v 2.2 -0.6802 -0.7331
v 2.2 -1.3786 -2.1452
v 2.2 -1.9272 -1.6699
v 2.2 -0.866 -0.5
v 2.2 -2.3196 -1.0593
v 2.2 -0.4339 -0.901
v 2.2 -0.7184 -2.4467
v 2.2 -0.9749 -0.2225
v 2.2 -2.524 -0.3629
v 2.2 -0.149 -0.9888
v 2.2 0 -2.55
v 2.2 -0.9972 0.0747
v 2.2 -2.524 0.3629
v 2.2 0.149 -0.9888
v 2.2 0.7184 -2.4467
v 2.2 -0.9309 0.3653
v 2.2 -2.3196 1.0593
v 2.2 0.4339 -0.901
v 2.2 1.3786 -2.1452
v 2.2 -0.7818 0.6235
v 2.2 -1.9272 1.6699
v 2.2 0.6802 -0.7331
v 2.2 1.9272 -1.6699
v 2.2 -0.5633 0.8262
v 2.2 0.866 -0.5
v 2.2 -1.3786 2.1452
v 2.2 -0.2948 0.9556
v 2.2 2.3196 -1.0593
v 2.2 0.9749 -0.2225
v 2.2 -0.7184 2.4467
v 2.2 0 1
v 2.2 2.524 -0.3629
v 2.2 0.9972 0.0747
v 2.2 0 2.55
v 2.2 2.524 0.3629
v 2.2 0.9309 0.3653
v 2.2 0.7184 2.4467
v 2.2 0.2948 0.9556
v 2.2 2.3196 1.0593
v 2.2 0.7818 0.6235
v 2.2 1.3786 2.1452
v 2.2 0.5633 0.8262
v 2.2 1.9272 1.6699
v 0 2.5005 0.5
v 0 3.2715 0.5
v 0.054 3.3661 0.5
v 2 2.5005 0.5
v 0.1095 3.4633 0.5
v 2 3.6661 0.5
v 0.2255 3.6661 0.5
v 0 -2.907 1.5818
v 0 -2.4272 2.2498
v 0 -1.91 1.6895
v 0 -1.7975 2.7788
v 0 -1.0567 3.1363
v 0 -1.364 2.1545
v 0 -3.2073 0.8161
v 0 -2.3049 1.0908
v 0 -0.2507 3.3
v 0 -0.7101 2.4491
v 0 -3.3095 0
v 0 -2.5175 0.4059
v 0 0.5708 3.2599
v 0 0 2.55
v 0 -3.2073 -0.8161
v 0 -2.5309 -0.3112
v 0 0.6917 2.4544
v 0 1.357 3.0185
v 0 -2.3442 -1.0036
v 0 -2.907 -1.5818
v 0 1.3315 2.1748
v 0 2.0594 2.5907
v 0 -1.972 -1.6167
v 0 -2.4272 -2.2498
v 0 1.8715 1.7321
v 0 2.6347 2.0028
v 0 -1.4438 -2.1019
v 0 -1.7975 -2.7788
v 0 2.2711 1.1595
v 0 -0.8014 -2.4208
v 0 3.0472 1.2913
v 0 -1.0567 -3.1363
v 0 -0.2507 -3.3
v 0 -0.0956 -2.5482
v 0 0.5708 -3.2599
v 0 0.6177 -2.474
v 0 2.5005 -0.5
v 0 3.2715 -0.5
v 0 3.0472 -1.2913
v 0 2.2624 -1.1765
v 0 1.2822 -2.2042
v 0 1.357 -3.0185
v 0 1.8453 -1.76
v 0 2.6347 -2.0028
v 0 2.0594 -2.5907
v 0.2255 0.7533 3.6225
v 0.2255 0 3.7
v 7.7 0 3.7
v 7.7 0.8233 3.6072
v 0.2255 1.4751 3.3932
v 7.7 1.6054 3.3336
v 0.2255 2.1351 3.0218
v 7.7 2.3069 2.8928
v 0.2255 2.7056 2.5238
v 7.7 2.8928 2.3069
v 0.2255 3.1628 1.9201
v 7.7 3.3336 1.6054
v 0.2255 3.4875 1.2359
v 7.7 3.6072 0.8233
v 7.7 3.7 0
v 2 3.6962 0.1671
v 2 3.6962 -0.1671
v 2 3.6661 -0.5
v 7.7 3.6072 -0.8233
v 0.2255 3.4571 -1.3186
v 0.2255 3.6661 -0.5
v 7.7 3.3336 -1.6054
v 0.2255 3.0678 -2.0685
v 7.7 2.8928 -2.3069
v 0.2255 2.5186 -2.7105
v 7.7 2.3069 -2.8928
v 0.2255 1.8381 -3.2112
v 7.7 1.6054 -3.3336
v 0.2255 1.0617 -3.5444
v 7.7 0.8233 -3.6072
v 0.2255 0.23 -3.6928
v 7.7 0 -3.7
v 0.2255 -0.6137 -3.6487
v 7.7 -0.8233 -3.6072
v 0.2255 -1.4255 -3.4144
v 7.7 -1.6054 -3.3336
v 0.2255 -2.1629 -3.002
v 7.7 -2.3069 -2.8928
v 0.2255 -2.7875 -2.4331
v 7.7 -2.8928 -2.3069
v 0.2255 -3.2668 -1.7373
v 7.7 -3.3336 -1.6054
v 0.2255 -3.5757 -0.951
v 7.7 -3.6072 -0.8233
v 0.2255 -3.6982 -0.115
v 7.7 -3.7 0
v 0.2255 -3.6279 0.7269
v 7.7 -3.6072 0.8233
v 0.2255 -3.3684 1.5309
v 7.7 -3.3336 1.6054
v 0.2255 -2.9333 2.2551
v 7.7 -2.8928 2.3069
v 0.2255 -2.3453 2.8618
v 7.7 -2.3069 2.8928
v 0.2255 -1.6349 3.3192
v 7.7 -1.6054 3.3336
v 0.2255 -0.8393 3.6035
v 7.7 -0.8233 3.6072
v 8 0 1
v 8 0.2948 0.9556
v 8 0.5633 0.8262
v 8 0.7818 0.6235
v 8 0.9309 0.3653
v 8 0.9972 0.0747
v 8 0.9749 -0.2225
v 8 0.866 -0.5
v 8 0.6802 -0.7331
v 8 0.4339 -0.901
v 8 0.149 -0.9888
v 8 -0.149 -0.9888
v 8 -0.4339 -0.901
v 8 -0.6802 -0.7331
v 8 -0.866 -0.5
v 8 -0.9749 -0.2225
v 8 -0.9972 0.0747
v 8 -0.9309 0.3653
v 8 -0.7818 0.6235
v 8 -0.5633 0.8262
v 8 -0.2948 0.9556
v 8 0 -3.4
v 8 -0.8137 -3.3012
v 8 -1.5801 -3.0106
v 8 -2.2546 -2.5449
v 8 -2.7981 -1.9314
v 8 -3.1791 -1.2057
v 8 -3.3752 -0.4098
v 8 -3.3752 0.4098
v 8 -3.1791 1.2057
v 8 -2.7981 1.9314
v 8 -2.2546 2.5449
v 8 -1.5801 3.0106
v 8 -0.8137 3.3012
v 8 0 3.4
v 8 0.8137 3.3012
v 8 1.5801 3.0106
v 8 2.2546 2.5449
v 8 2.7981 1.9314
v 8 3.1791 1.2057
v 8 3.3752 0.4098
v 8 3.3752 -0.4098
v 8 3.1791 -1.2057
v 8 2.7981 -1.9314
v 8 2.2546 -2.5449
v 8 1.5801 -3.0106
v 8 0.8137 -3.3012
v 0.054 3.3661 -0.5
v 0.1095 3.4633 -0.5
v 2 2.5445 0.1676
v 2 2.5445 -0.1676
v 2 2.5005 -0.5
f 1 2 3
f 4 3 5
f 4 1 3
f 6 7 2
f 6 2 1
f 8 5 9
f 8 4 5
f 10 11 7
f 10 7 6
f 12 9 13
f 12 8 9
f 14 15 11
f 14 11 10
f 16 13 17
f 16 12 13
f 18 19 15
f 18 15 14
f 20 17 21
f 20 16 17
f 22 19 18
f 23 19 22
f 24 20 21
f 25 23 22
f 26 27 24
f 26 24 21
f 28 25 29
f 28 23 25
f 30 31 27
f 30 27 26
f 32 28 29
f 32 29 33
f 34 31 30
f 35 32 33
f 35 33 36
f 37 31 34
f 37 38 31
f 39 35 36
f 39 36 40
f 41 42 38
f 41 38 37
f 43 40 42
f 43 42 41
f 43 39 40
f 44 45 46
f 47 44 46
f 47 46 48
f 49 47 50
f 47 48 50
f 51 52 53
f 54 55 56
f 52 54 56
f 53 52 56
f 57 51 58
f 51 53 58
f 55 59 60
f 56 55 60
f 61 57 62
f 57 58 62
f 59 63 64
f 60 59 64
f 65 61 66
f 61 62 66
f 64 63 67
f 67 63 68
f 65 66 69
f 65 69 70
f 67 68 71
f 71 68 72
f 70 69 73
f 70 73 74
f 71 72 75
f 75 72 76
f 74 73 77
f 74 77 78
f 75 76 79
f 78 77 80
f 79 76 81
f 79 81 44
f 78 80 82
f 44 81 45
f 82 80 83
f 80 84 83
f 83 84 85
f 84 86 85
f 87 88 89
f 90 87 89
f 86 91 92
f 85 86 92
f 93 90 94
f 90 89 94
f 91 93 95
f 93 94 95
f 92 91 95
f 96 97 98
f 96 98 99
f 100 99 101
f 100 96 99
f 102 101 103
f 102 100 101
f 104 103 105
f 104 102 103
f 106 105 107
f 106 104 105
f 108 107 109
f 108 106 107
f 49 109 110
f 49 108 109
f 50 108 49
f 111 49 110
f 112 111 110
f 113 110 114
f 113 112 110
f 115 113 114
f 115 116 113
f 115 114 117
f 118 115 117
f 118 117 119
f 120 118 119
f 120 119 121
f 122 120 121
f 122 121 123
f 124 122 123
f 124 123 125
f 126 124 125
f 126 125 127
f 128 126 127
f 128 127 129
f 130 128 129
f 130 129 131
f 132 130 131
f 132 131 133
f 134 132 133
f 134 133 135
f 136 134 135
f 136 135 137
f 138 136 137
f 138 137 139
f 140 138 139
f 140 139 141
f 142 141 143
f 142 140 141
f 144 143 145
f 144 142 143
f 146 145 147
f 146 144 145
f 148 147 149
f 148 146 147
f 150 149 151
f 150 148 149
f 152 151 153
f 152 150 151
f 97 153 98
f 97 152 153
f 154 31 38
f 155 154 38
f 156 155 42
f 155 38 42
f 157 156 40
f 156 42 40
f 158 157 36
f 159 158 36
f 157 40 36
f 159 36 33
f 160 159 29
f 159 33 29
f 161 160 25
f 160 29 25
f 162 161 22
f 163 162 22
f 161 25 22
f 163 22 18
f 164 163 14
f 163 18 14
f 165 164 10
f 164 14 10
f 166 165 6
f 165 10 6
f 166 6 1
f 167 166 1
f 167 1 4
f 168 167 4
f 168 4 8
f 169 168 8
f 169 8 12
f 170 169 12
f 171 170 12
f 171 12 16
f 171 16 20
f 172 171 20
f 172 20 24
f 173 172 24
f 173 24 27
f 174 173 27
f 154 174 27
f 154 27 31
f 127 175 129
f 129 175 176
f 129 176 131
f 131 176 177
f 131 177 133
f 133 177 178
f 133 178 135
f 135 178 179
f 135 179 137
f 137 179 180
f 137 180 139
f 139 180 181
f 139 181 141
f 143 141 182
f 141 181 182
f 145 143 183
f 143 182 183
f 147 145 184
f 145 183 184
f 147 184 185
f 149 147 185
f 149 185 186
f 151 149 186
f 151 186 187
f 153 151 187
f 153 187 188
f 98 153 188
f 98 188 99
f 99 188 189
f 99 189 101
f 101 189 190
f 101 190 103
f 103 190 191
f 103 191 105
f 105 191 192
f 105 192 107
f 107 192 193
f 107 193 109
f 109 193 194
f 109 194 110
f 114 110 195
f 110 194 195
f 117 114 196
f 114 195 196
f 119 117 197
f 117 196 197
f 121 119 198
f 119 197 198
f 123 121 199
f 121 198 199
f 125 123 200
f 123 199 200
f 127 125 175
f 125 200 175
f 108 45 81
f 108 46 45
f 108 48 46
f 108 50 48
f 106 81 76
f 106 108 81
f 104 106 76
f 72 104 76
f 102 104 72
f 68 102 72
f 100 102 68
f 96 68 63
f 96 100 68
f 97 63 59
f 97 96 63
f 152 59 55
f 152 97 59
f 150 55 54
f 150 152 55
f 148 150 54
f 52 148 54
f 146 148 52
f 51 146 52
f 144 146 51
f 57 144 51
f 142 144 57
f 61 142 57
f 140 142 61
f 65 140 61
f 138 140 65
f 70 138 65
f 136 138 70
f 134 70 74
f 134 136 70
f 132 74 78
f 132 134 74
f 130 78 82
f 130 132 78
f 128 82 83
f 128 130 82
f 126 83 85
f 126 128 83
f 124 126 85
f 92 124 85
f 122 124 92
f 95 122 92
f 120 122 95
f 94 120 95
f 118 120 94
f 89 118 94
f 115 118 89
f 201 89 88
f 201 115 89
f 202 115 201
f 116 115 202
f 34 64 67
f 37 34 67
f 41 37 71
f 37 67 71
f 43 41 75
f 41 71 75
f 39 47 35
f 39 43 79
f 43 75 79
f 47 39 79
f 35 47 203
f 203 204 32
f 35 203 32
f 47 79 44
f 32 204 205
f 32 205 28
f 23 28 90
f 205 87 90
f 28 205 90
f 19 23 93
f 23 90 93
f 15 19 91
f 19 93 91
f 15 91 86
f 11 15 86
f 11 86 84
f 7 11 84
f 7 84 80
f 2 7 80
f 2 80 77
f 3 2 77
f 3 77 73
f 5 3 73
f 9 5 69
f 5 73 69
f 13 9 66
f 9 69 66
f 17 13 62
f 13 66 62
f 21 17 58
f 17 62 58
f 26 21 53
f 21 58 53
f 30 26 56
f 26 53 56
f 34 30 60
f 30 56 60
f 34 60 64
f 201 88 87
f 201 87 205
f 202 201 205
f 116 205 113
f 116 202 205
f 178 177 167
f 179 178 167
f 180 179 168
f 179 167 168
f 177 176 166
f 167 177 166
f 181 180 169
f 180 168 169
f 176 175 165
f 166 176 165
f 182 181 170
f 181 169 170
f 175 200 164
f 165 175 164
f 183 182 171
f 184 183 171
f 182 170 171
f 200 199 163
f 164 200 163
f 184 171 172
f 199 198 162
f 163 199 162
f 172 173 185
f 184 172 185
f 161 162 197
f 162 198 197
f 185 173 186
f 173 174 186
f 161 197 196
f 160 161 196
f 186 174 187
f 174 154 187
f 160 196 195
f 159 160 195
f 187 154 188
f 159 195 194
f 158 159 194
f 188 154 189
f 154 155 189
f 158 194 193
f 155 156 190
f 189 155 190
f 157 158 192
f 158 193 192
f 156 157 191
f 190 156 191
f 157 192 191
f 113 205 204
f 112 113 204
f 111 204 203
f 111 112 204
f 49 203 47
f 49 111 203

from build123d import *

# Parameters (mm, degrees)
CHANFREIN1_SIZE         = 0.6905
CHANFREIN1_SIZE2        = 0.398660361
ESQUISSE3_R             = 2.55
ENL_V_MAT_EXTRU_2_DEPTH = 2.2
ESQUISSE4_R             = 4
ENL_V_MAT_EXTRU_3_DEPTH = 12.2
CHANFREIN2_SIZE         = 0.6
ESQUISSE5_OUTSIDE_W     = 12.772
ESQUISSE5_OUTSIDE_H     = 12.772
ESQUISSE5_OUTSIDE_R     = 3.7
ENL_V_MAT_EXTRU_4_DEPTH = 10.797958971
ESQUISSE6_W             = 1
ESQUISSE6_H             = 2.203007131
ENL_V_MAT_EXTRU_5_DEPTH = 2
ESQUISSE7_R             = 1
ENL_V_MAT_EXTRU_6_DEPTH = 8.81152994


with BuildPart() as part:
    # Esquisse1 → Révolution1 (revolve)
    with BuildSketch(Plane.XY, mode=Mode.PRIVATE) as r_volution1_sk:
        Polygon((0, 4), (0, 0), (12.000000001, 0), (8, 4), align=None)
    revolve(r_volution1_sk.sketch.rotate(Axis((0, 0, 0), (1, 0, 0)), 270), axis=Axis((0, 0, 0), (1, 0, 0)))

    # Chanfrein1
    chanfrein1_edges = [part.edges().sort_by_distance(p)[0] for p in [
        (0, 0, 4),
    ]]
    chanfrein1_side = [part.faces().sort_by_distance(p)[0] for p in [
        (0, 0, 0),
    ]]
    chamfer(chanfrein1_edges, length=CHANFREIN1_SIZE, length2=CHANFREIN1_SIZE2, reference=chanfrein1_side[0])

    # Esquisse3 → Enlèv. mat.-Extru.2 (cut)
    with BuildSketch(Plane.ZY):
        Circle(ESQUISSE3_R)
    extrude(amount=-ENL_V_MAT_EXTRU_2_DEPTH, mode=Mode.SUBTRACT)

    # Esquisse4 → Enlèv. mat.-Extru.3 (cut)
    with BuildSketch(Plane.ZY.offset(-8)):
        Circle(ESQUISSE4_R)
    extrude(amount=-ENL_V_MAT_EXTRU_3_DEPTH, mode=Mode.SUBTRACT)

    # Chanfrein2
    chanfrein2_edges = [part.edges().sort_by_distance(p)[0] for p in [
        (8, 0, 4),
    ]]
    chamfer(chanfrein2_edges, length=CHANFREIN2_SIZE)

    # Esquisse5 outside → Enlèv. mat.-Extru.4 (cut, through all)
    with BuildSketch(Plane.ZY):
        Rectangle(ESQUISSE5_OUTSIDE_W, ESQUISSE5_OUTSIDE_H)
        Circle(ESQUISSE5_OUTSIDE_R, mode=Mode.SUBTRACT)
    extrude(amount=-ENL_V_MAT_EXTRU_4_DEPTH, mode=Mode.SUBTRACT)

    # Esquisse6 → Enlèv. mat.-Extru.5 (cut)
    with BuildSketch(Plane.ZY):
        with Locations((0, 3.309500001)):
            Rectangle(ESQUISSE6_W, ESQUISSE6_H)
    extrude(amount=-ENL_V_MAT_EXTRU_5_DEPTH, mode=Mode.SUBTRACT)

    # Esquisse7 → Enlèv. mat.-Extru.6 (cut, through all)
    with BuildSketch(Plane.ZY.offset(-2.2)):
        Circle(ESQUISSE7_R)
    extrude(amount=-ENL_V_MAT_EXTRU_6_DEPTH, mode=Mode.SUBTRACT)


solid = part.part
